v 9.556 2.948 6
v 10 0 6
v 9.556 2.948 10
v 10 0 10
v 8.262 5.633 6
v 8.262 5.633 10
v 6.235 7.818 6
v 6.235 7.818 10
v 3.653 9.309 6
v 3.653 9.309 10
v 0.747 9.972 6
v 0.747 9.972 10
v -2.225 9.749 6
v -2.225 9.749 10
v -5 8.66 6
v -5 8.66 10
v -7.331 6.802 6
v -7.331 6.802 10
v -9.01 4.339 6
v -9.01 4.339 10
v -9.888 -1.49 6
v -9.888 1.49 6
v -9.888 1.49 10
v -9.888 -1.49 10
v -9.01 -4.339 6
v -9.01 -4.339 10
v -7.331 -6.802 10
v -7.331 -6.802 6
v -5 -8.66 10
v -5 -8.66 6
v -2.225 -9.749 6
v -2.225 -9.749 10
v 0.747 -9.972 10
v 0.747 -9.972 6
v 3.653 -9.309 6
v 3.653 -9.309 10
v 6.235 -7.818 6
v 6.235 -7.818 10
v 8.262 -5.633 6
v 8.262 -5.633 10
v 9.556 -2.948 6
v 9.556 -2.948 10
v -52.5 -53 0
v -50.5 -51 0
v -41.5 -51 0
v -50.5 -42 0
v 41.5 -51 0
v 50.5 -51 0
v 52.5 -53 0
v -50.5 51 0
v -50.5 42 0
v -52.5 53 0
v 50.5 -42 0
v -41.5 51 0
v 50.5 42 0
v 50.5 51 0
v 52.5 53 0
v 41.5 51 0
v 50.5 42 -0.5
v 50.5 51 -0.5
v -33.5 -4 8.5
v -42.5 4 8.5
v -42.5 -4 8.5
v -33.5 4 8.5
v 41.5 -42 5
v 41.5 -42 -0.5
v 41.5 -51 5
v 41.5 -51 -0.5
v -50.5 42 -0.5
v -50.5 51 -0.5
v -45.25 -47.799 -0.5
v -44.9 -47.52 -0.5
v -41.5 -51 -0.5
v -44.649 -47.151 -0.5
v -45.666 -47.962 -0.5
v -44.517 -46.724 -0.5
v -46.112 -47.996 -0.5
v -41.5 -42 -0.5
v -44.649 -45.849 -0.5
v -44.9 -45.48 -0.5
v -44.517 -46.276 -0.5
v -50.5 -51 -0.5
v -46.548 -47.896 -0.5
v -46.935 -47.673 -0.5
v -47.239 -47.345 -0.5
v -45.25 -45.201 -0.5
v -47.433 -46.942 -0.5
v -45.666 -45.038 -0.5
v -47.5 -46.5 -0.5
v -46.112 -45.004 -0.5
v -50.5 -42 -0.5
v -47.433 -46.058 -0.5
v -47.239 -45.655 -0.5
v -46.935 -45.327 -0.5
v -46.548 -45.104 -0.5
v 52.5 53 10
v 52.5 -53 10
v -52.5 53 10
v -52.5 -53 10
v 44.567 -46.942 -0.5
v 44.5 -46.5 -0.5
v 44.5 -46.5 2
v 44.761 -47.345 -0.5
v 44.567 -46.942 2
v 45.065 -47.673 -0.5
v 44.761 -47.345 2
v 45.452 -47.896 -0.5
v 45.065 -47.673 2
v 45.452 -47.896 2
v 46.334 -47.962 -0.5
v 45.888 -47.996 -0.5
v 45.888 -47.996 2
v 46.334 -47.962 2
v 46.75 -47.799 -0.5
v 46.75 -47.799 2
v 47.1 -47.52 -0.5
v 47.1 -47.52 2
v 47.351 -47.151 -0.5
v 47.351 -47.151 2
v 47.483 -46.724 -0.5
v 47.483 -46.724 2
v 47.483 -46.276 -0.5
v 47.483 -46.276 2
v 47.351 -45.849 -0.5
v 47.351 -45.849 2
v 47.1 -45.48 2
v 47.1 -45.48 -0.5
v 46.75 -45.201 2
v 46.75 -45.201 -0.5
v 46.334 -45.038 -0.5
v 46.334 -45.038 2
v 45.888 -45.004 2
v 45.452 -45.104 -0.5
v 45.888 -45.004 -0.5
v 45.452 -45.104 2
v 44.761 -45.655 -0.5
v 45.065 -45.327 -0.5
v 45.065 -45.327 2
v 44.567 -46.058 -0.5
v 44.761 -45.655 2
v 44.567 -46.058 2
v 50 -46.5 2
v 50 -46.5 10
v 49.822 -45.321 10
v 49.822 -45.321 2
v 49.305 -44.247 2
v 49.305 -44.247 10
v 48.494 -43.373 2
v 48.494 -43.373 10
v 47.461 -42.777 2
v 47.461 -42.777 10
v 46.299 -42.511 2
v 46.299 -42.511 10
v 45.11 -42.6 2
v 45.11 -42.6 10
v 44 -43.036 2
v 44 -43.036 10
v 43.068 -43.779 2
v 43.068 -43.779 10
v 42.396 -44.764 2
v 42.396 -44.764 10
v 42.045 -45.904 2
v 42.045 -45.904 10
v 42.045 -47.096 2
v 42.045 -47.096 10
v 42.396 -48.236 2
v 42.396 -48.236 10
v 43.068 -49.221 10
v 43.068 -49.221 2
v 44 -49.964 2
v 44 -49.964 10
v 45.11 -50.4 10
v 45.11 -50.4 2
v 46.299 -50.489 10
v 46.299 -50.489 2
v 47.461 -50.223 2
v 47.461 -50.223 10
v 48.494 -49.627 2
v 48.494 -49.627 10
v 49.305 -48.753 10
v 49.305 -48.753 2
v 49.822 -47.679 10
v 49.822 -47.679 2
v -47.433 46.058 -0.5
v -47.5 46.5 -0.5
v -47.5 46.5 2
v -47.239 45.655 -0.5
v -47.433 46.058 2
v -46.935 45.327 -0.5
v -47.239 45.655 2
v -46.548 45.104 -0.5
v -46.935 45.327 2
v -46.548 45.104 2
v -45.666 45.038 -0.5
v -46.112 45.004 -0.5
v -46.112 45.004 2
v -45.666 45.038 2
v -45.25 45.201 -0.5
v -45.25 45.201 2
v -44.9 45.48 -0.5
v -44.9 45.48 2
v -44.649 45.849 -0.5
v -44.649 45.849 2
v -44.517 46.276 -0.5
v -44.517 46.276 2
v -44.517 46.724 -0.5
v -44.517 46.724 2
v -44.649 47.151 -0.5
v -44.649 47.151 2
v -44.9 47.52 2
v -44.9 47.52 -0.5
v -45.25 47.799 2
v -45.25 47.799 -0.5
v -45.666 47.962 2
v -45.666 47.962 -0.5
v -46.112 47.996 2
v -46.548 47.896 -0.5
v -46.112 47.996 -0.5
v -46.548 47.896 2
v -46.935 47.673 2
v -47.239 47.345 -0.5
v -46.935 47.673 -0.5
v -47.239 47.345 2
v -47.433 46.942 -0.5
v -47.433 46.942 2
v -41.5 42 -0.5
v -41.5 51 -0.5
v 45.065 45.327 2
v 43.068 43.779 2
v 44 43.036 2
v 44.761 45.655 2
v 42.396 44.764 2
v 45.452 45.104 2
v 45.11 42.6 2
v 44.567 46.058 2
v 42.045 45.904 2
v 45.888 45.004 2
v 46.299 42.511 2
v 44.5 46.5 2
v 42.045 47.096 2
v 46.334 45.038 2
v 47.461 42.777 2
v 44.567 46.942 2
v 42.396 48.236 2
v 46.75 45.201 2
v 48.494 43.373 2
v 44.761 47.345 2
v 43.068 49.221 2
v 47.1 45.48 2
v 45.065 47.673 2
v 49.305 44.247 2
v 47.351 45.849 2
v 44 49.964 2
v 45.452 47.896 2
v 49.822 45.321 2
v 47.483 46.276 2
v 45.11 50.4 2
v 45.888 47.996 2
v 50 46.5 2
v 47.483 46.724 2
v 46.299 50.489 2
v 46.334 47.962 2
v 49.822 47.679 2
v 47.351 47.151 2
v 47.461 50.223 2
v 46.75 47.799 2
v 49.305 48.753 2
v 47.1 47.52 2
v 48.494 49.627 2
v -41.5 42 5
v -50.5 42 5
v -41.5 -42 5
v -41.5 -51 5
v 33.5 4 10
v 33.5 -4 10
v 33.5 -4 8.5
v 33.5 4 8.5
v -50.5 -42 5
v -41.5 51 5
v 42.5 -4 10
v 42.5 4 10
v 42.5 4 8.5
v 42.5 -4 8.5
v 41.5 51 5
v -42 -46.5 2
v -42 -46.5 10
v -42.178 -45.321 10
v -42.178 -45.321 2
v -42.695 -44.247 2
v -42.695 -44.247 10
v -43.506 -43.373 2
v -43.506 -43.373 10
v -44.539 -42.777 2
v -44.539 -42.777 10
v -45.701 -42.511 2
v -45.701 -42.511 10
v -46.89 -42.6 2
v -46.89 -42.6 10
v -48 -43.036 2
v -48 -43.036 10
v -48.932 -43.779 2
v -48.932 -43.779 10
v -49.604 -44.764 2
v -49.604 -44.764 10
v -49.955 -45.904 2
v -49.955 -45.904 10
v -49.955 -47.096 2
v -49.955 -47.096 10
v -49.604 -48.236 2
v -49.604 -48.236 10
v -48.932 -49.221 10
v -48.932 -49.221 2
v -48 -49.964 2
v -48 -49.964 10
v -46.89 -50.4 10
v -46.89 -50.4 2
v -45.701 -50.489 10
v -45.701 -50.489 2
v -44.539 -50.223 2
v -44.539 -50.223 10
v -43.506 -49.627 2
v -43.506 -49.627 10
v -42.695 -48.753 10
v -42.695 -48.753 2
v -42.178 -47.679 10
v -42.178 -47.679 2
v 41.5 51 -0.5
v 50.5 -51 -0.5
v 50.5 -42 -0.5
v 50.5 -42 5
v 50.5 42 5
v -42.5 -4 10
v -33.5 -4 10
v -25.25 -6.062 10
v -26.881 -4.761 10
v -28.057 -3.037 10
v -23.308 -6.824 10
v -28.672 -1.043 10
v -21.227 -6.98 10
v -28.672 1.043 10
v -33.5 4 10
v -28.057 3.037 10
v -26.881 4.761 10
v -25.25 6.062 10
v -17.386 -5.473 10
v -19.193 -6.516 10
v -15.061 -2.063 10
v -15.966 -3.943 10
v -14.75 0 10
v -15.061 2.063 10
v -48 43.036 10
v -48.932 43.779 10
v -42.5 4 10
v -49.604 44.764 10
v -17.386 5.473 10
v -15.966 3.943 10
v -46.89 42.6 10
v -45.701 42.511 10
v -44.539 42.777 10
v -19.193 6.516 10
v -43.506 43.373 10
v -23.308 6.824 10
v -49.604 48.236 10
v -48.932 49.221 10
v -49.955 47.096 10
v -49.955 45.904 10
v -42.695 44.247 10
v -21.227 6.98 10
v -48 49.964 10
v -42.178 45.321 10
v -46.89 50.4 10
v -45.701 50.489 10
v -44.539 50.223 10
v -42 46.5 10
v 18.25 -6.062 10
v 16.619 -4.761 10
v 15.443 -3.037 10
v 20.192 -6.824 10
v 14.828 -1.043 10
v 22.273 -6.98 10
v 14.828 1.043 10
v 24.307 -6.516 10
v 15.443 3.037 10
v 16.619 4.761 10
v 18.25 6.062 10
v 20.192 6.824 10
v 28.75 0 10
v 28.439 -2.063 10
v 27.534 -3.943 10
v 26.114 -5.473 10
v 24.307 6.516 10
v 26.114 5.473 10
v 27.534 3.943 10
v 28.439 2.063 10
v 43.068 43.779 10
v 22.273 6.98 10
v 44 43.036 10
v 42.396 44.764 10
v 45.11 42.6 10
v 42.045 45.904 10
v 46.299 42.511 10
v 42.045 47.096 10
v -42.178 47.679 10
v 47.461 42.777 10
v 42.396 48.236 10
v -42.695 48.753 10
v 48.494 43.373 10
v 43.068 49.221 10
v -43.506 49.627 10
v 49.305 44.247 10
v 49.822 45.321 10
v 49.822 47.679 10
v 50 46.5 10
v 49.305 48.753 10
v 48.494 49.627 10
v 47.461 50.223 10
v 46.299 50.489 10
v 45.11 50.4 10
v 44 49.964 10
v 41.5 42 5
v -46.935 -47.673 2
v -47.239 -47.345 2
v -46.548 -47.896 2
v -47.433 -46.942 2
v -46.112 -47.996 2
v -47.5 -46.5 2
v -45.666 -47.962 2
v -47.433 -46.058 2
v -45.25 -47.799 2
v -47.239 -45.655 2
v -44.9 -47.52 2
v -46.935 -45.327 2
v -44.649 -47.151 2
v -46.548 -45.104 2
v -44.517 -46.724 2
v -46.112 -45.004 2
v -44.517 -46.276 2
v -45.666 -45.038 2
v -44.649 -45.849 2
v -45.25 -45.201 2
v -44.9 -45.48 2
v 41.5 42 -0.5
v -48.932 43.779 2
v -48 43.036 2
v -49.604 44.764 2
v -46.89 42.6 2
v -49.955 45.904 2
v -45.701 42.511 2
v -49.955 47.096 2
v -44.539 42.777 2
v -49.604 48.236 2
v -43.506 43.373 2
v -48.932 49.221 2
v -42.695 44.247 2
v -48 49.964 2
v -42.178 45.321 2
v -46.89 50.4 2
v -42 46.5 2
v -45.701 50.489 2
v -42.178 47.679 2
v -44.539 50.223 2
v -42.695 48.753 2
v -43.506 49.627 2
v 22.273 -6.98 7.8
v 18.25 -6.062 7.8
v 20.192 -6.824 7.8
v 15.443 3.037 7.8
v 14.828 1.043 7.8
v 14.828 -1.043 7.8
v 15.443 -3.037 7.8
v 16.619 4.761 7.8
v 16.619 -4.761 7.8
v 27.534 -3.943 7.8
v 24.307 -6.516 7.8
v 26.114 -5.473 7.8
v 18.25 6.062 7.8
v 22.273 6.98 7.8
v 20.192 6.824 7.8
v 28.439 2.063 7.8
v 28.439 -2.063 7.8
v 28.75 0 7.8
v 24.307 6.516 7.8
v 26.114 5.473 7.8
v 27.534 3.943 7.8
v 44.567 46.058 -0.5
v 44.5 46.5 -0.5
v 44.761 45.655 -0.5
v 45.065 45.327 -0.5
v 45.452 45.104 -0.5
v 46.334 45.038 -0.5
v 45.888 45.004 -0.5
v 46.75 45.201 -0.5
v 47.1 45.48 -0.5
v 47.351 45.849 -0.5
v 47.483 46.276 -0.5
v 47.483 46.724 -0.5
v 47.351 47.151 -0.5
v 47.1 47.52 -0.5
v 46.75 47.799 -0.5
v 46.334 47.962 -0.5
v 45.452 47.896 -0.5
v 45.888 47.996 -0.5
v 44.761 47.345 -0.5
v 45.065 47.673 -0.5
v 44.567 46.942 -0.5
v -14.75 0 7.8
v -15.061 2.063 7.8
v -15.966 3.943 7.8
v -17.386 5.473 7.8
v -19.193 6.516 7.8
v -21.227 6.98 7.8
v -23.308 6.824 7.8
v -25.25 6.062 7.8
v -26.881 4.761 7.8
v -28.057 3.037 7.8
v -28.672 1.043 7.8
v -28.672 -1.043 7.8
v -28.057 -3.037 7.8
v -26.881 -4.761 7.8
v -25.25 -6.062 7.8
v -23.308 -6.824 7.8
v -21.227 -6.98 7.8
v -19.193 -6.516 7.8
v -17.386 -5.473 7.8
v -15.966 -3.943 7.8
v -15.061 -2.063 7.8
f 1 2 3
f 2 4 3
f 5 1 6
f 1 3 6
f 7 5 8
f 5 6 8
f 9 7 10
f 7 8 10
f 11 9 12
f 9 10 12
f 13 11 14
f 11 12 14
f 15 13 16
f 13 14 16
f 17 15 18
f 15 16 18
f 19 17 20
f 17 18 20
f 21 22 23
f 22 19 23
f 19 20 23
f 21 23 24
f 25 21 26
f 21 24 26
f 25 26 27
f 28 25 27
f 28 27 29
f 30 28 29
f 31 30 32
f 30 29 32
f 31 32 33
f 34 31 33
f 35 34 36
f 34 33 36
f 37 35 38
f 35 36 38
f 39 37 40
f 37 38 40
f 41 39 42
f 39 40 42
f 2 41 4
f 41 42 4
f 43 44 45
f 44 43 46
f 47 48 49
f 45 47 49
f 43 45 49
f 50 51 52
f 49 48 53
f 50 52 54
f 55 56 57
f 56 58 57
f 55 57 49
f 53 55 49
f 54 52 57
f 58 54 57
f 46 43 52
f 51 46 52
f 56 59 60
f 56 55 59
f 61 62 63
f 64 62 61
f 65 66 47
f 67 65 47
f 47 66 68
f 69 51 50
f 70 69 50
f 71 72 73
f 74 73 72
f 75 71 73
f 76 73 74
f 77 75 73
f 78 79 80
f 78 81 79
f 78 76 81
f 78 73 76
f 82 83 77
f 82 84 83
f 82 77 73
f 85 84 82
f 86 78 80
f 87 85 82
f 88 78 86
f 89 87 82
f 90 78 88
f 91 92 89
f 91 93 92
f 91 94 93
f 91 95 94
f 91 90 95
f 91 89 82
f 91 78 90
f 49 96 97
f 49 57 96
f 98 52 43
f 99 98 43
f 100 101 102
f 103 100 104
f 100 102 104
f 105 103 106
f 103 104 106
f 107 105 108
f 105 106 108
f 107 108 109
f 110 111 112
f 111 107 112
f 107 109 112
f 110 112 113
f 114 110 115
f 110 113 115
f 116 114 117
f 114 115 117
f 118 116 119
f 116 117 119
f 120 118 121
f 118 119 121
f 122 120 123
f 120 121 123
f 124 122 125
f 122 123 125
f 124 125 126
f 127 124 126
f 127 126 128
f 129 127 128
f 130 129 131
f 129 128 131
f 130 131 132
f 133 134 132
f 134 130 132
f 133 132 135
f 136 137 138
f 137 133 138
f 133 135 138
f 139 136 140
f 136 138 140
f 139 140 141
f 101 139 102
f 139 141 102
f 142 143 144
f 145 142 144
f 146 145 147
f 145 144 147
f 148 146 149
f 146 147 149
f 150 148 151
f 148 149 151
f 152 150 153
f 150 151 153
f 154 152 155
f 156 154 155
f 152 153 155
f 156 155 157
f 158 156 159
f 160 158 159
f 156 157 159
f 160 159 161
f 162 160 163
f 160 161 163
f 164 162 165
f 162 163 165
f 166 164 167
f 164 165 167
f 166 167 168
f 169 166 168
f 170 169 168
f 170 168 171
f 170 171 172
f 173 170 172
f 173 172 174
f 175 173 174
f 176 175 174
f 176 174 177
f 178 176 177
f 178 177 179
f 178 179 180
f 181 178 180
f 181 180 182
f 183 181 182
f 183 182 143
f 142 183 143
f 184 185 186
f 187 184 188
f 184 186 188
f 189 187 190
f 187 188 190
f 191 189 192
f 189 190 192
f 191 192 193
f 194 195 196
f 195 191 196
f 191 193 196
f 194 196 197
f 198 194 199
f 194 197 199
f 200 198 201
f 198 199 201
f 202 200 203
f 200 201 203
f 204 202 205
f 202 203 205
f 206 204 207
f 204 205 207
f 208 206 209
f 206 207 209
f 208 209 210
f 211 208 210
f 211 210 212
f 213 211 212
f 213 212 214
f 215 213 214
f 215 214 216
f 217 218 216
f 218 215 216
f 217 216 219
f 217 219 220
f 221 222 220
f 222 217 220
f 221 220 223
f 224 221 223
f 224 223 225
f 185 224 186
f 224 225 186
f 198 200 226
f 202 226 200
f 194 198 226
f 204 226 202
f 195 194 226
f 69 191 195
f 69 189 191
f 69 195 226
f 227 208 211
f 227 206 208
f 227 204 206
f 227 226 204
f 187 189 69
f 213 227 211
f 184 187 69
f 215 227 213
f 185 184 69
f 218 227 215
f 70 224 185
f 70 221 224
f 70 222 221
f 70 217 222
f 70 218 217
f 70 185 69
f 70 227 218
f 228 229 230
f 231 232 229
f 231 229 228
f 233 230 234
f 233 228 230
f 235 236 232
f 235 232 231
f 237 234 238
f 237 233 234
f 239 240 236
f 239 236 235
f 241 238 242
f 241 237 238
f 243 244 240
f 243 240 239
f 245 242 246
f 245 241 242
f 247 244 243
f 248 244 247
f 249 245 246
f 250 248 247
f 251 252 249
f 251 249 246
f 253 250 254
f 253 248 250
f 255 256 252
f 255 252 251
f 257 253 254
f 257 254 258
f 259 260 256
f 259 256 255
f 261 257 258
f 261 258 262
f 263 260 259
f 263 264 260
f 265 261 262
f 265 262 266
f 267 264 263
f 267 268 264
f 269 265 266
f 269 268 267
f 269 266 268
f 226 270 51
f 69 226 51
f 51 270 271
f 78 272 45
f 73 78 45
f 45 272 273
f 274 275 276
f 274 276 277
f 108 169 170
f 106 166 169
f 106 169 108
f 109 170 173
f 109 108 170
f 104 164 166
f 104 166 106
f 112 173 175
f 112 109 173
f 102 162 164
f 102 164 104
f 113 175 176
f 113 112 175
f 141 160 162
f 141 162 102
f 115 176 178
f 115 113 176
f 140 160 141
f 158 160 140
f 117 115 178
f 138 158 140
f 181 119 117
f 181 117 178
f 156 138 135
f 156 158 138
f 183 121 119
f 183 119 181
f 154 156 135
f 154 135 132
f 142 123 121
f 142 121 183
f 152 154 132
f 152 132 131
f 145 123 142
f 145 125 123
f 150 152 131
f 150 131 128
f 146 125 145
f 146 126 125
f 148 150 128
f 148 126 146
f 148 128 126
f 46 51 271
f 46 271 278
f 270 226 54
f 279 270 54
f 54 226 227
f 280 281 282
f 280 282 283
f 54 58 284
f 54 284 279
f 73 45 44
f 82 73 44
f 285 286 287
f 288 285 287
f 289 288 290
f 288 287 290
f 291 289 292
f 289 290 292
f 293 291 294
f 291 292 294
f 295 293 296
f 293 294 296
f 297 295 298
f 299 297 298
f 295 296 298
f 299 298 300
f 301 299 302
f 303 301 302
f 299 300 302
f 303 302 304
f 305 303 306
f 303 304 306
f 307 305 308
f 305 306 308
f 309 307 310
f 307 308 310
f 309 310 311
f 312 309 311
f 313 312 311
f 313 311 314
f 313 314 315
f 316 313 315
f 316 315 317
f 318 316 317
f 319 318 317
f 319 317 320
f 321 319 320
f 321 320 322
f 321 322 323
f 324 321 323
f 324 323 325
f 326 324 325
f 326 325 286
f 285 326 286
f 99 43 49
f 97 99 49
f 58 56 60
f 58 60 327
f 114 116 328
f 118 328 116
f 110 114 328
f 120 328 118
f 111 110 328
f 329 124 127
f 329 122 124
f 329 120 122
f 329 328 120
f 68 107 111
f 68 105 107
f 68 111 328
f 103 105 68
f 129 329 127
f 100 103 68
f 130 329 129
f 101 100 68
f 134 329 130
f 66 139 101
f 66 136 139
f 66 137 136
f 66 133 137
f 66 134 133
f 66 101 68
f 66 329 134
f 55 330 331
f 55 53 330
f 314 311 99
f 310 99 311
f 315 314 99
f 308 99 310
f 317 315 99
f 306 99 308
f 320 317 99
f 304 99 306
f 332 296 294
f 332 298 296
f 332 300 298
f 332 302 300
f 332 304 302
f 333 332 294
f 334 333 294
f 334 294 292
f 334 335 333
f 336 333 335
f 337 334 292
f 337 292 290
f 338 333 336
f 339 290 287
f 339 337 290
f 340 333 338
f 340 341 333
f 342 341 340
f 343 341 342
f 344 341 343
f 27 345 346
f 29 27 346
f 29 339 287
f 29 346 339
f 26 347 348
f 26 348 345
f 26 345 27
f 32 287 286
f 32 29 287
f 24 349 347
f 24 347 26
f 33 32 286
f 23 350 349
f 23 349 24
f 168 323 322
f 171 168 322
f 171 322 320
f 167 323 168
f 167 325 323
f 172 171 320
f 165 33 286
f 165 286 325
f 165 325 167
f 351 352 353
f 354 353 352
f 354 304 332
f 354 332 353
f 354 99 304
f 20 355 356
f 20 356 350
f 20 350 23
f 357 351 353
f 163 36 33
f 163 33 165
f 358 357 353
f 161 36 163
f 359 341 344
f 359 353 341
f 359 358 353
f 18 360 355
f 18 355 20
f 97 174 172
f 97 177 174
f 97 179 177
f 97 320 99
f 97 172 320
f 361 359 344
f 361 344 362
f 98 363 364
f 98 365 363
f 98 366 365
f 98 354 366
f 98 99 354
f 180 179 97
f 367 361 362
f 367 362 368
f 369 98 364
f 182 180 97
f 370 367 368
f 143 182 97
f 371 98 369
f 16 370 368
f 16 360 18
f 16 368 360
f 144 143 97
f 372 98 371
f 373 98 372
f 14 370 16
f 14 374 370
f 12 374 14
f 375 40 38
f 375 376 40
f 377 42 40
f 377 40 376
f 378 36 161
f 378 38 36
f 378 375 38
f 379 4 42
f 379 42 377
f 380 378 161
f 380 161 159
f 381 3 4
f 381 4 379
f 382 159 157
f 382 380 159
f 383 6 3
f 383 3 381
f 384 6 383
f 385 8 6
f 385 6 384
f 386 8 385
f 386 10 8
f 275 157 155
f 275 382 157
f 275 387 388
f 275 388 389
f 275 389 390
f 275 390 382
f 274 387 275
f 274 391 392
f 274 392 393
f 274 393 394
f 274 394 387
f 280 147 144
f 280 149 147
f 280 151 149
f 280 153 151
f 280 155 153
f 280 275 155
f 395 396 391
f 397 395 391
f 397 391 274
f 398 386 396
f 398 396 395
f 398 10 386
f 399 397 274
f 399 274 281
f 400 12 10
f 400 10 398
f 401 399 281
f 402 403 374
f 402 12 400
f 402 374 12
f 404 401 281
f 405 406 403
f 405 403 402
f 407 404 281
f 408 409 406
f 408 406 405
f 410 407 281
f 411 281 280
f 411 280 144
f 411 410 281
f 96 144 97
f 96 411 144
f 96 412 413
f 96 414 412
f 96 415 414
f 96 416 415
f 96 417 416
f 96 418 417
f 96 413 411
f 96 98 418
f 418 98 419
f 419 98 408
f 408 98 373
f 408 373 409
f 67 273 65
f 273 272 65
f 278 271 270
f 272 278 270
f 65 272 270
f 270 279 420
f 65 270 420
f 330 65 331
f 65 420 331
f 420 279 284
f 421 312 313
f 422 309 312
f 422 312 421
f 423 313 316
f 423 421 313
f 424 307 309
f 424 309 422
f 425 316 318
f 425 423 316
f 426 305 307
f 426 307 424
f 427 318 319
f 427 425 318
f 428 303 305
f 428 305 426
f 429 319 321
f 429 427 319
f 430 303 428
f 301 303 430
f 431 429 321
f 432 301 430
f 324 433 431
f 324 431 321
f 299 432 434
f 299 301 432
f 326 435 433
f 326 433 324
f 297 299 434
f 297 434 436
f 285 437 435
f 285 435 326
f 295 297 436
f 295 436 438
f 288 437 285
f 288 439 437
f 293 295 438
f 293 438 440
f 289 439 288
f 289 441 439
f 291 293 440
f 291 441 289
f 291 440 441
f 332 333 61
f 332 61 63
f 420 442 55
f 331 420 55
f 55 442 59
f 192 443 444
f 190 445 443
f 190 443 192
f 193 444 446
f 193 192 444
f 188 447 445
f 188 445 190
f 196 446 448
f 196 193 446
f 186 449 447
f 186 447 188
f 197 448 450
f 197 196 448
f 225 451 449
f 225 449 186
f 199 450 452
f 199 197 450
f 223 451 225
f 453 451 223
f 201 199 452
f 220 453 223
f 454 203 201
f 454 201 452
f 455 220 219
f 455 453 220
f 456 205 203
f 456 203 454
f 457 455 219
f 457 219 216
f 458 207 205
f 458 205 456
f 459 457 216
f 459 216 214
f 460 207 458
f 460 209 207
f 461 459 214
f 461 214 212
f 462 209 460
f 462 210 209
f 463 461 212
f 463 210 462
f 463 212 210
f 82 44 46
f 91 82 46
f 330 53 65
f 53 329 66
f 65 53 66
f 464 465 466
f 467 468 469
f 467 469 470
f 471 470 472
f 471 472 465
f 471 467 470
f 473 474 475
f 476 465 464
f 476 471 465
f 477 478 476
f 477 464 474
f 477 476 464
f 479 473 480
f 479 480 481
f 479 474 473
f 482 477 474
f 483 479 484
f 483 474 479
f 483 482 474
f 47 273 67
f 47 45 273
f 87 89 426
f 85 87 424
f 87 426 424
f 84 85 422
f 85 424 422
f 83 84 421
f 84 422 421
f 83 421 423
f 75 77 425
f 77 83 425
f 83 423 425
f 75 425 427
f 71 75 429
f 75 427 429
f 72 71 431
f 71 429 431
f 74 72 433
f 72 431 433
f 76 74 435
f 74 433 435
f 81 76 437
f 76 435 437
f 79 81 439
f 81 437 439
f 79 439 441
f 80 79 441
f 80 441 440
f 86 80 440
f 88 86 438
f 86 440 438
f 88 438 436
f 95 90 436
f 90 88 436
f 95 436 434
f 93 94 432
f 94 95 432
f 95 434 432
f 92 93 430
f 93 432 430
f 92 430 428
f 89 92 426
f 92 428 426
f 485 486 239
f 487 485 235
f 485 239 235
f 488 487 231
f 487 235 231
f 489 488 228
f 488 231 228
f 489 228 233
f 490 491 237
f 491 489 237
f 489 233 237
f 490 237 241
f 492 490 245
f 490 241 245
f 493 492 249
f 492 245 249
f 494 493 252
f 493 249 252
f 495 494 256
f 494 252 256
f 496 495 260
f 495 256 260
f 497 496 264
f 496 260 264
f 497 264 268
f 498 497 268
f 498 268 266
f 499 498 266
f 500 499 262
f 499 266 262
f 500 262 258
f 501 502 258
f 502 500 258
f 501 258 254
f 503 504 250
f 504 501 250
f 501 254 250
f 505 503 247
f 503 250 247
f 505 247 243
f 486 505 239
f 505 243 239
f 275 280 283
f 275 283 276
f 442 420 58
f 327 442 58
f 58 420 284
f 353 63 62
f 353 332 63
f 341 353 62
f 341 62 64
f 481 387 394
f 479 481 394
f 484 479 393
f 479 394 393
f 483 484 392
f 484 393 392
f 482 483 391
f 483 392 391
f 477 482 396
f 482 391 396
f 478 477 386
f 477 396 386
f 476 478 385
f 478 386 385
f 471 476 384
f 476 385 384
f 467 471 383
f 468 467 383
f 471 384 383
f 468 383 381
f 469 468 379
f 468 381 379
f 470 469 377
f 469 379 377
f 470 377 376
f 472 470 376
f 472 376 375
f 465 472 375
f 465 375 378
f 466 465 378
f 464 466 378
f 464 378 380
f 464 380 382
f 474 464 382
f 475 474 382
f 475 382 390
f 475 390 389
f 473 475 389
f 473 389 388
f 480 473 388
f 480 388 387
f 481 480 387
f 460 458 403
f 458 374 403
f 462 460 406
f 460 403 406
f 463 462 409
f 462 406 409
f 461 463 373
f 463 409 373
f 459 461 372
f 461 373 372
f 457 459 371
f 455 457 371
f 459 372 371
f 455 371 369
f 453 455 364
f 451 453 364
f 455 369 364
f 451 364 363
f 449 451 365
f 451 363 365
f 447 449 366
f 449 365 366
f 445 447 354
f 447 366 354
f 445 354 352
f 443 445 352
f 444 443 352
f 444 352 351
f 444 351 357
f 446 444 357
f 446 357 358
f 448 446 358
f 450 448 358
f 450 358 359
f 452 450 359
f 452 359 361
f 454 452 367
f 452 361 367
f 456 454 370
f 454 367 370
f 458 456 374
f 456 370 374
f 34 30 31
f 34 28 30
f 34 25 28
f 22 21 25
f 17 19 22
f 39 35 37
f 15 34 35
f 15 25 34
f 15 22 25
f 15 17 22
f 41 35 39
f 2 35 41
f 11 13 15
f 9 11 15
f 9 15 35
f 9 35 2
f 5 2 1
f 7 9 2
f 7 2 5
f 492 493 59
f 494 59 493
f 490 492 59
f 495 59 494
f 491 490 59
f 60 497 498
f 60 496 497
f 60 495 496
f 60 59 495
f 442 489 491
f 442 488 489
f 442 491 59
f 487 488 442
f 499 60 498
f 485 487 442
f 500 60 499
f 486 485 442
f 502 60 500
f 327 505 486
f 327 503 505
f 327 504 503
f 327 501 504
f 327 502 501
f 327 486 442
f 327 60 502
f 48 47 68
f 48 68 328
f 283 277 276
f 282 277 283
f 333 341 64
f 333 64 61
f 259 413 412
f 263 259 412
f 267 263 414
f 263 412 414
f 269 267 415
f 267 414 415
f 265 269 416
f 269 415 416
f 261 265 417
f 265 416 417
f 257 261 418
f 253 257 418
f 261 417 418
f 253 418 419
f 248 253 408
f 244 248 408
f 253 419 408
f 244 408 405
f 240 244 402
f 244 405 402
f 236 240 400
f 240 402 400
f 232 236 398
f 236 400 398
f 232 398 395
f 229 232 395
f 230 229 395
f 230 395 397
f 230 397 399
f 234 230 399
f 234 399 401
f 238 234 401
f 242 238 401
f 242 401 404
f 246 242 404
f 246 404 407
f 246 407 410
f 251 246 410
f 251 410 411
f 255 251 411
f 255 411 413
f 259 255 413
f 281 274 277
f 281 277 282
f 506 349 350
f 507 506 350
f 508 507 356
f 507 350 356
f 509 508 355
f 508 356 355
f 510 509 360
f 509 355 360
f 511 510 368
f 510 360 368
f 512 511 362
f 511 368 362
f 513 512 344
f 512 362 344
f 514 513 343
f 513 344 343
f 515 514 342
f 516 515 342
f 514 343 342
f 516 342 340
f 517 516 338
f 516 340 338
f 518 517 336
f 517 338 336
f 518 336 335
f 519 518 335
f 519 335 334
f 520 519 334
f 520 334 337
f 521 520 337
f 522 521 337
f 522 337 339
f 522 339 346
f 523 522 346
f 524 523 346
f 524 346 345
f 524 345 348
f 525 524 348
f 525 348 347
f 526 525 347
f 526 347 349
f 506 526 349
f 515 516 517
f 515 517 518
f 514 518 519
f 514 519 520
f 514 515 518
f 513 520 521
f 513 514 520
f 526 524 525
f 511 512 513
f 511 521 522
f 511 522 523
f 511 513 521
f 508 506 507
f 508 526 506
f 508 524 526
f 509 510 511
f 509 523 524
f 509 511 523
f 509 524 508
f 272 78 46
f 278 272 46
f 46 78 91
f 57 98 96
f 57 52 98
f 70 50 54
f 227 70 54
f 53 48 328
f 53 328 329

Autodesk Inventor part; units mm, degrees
ref_plane "YZ Plane" through (0, 0, 0) normal (1, 0, 0) x (0, 1, 0)
ref_plane "XZ Plane" through (0, 0, 0) normal (0, 1, 0) x (-1, 0, 0)
ref_plane "XY Plane" through (0, 0, 0) normal (0, 0, 1) x (1, 0, 0)
sketch "Sketch1" plane through (0, 0, 0) normal (0, 0, 1) x (1, 0, 0)
  line L0 (52.5, 53) -> (52.5, -53) projected
  line L1 (-52.5, 53) -> (52.5, 53) projected
  line L2 (52.5, 53) -> (-52.5, 53)
  line L3 (-52.5, 53) -> (-52.5, -53)
  line L4 (-52.5, -53) -> (52.5, -53)
  line L5 (52.5, -53) -> (52.5, 53)
  line L6 (50.5, -51) -> (50.5, 51) projected
  line L7 (50.5, 51) -> (-50.5, 51) projected
  line L8 (50.5, 51) -> (-50.5, 51)
  line L9 (-50.5, 51) -> (-50.5, -51)
  line L10 (-50.5, -51) -> (50.5, -51)
  line L11 (50.5, -51) -> (50.5, 51)
  point P0 (0, 0)
extrude "Extrusion1" add sketch "Sketch1" along normal blind 10
sketch "Sketch2" plane through (0, 0, 0) normal (0, 0, -1) x (-1, 0, 0)
  circle A0 centre (-46, 46.5) radius 1.5 projected
  line L0 (-50.5, 51) -> (-50.5, 42) projected
  line L1 (-41.5, 51) -> (-50.5, 51) projected
  line L2 (-41.5, 51) -> (-41.5, 42) projected
  line L3 (-41.5, 42) -> (-50.5, 42) projected
  circle A1 centre (-46, -46.5) radius 1.5 projected
  line L4 (-41.5, -42) -> (-41.5, -51) projected
  line L5 (-50.5, -51) -> (-41.5, -51) projected
  line L6 (-50.5, -42) -> (-50.5, -51) projected
  line L7 (-50.5, -42) -> (-41.5, -42) projected
  circle A2 centre (46, -46.5) radius 1.5 projected
  line L8 (50.5, -51) -> (50.5, -42) projected
  line L9 (41.5, -51) -> (50.5, -51) projected
  line L10 (41.5, -51) -> (41.5, -42) projected
  line L11 (41.5, -42) -> (50.5, -42) projected
  circle A3 centre (46, 46.5) radius 1.5 projected
  line L12 (41.5, 42) -> (41.5, 51) projected
  line L13 (50.5, 51) -> (41.5, 51) projected
  line L14 (50.5, 42) -> (50.5, 51) projected
  line L15 (50.5, 42) -> (41.5, 42) projected
  point P0 (0, 0)
extrude "Extrusion2" add sketch "Sketch2" against normal blind 10
sketch "Sketch3" plane through (0, 0, 10) normal (0, 0, 1) x (1, 0, 0)
  line L0 (43.467, -7.68) -> (39.533, -7.68) projected
  line L1 (39.533, -7.68) -> (39.533, -6.68) projected
  line L2 (39.533, -6.68) -> (43.467, -6.68) projected
  line L3 (43.467, -6.68) -> (43.467, -7.68) projected
  line L4 (41.5, 42) -> (41.5, 51) projected
  line L5 (41.5, 51) -> (-41.5, 51) projected
  line L6 (-41.5, 51) -> (-41.5, 42) projected
  line L7 (-41.5, 42) -> (-50.5, 42) projected
  line L8 (-50.5, 42) -> (-50.5, -42) projected
  line L9 (-50.5, -42) -> (-41.5, -42) projected
  line L10 (-41.5, -42) -> (-41.5, -51) projected
  line L11 (-41.5, -51) -> (41.5, -51) projected
  line L12 (41.5, -51) -> (41.5, -42) projected
  line L13 (41.5, -42) -> (50.5, -42) projected
  line L14 (50.5, -42) -> (50.5, 42) projected
  line L15 (50.5, 42) -> (41.5, 42) projected
  line L16 (43.467, -7.68) -> (39.533, -7.68) projected
  line L17 (39.533, -7.68) -> (39.533, -6.68) projected
  line L18 (39.533, -6.68) -> (43.467, -6.68) projected
  line L19 (43.467, -6.68) -> (43.467, -7.68) projected
  line L20 (41.5, 42) -> (41.5, 51) projected
  line L21 (41.5, 51) -> (-41.5, 51) projected
  line L22 (-41.5, 51) -> (-41.5, 42) projected
  line L23 (-41.5, 42) -> (-50.5, 42) projected
  line L24 (-50.5, 42) -> (-50.5, -42) projected
  line L25 (-50.5, -42) -> (-41.5, -42) projected
  line L26 (-41.5, -42) -> (-41.5, -51) projected
  line L27 (-41.5, -51) -> (41.5, -51) projected
  line L28 (41.5, -51) -> (41.5, -42) projected
  line L29 (41.5, -42) -> (50.5, -42) projected
  line L30 (50.5, -42) -> (50.5, 42) projected
  line L31 (50.5, 42) -> (41.5, 42) projected
  circle A0 centre (44.2752, 10.8885) radius 1.8923 projected
  circle A1 centre (-22.2674, 46.7091) radius 1.9651 projected
  line L32 (38.467, -7.68) -> (34.533, -7.68) projected
  line L33 (34.533, -7.68) -> (34.533, -6.68) projected
  line L34 (34.533, -6.68) -> (38.467, -6.68) projected
  line L35 (38.467, -6.68) -> (38.467, -7.68) projected
  circle A2 centre (-36.634, 10.3057) radius 1.9118 projected
  circle A3 centre (44.2752, 10.8885) radius 1.8923 projected
  circle A4 centre (-22.2674, 46.7091) radius 1.9651 projected
  line L36 (38.467, -7.68) -> (34.533, -7.68) projected
  line L37 (34.533, -7.68) -> (34.533, -6.68) projected
  line L38 (34.533, -6.68) -> (38.467, -6.68) projected
  line L39 (38.467, -6.68) -> (38.467, -7.68) projected
  circle A5 centre (-36.634, 10.3057) radius 1.9118 projected
  point P0 (0, 0)
extrude "Extrusion3" add sketch "Sketch3" against normal blind 5 contours L0 L1 L2 L3 | L15 L14 L13 L12 L11 L10 L9 L8 L7 L6 L5 L4 | A0 | A1 | L32 L33 L34 L35 | A2
sketch "Sketch4" plane through (0, 0, 10) normal (0, 0, 1) x (1, 0, 0)
  circle A0 centre (46, 46.5) radius 1.5 projected
  circle A1 centre (46, -46.5) radius 1.5 projected
  circle A2 centre (-46, -46.5) radius 1.5 projected
  circle A3 centre (-46, 46.5) radius 1.5 projected
  circle A4 centre (46, 46.5) radius 4
  circle A5 centre (46, -46.5) radius 4
  circle A6 centre (-46, -46.5) radius 4
  circle A7 centre (-46, 46.5) radius 4
  point P0 (0, 0)
  dimension "d6" = 8
  dimension "d7" = 8
  dimension "d8" = 8
  dimension "d9" = 8
extrude "Extrusion4" cut sketch "Sketch4" against normal blind 8
sketch "Sketch5" plane through (0, 0, 10) normal (0, 0, 1) x (1, 0, 0)
  line L0 (-52.5, -53) -> (52.5, -53) projected
  line L1 (52.5, -53) -> (52.5, 53) projected
  line L2 (-52.5, -53) -> (52.5, -53)
  line L3 (52.5, -53) -> (52.5, 53)
  line L4 (52.5, 53) -> (-52.5, 53)
  line L5 (-52.5, 53) -> (-52.5, -53)
  line L6 (-52.5, 53) -> (-52.5, 0)
  circle A0 centre (0, 0) radius 10
  line L7 (-52.5, 0) -> (-42.5, 0)
  line L8 (-42.5, 0) -> (-42.5, 4)
  line L9 (-42.5, 4) -> (-33.5, 4)
  line L10 (-33.5, 4) -> (-33.5, -4)
  line L11 (-33.5, -4) -> (-42.5, -4)
  line L12 (-42.5, -4) -> (-42.5, 0)
  line L13 (-33.5, 0) -> (-10, 0)
  line L14 (-10, 0) -> (-21.75, 0)
  circle A1 centre (-21.75, 0) radius 7
  line L15 (0, 0) -> (21.75, 0)
  line L16 (42.5, 0) -> (42.5, -4)
  line L17 (42.5, -4) -> (33.5, -4)
  line L18 (33.5, -4) -> (33.5, 4)
  line L19 (33.5, 4) -> (42.5, 4)
  line L20 (42.5, 4) -> (42.5, 0)
  circle A2 centre (21.75, 0) radius 7
  point P0 (33.5, 0)
  dimension "d12" = 20
  dimension "d14" = 10
  dimension "d15" = 4
  dimension "d16" = 9
  dimension "d17" = 8
  dimension "d18" = 14
  dimension "d19" = 21.75
  dimension "d20" = 4
  dimension "d21" = 9
  dimension "d22" = 8
  dimension "d23" = 14
extrude "Extrusion5" cut sketch "Sketch5" against normal blind 4 contours A0
extrude "Extrusion6" cut sketch "Sketch5" against normal blind 2.2 contours A2 | A1 L13 | L13 A1
extrude "Extrusion7" cut sketch "Sketch5" against normal blind 1.5 contours L8 L9 L10 L11 L12 | L16 L17 L18 L19 L20
sketch "Sketch6" plane through (0, 0, 0) normal (0, 0, -1) x (-1, 0, 0)
  line L0 (-41.5, 42) -> (-41.5, 51) projected
  line L1 (-50.5, 42) -> (-41.5, 42) projected
  line L2 (-50.5, -42) -> (-50.5, 42) projected
  line L3 (-41.5, -42) -> (-50.5, -42) projected
  line L4 (-41.5, -51) -> (-41.5, -42) projected
  line L5 (41.5, -51) -> (-41.5, -51) projected
  line L6 (41.5, -42) -> (41.5, -51) projected
  line L7 (50.5, -42) -> (41.5, -42) projected
  line L8 (50.5, 42) -> (50.5, -42) projected
  line L9 (41.5, 42) -> (50.5, 42) projected
  line L10 (41.5, 51) -> (41.5, 42) projected
  line L11 (-41.5, 51) -> (41.5, 51) projected
  circle A0 centre (-46, 46.5) radius 1.5 projected
  circle A1 centre (-46, -46.5) radius 1.5 projected
  circle A2 centre (46, -46.5) radius 1.5 projected
  circle A3 centre (46, 46.5) radius 1.5 projected
  line L12 (-52.5, -53) -> (-52.5, 53) projected
  line L13 (52.5, -53) -> (-52.5, -53) projected
  line L14 (52.5, 53) -> (52.5, -53) projected
  line L15 (-52.5, 53) -> (52.5, 53) projected
  line L16 (-50.5, 42) -> (-50.5, -42) projected
  line L17 (-50.5, 42) -> (-41.5, 42) projected
  line L18 (-41.5, 42) -> (-41.5, 51) projected
  line L19 (41.5, 51) -> (-41.5, 51) projected
  line L20 (41.5, 51) -> (41.5, 42) projected
  line L21 (41.5, 42) -> (50.5, 42) projected
  line L22 (50.5, -42) -> (50.5, 42) projected
  line L23 (50.5, -42) -> (41.5, -42) projected
  line L24 (41.5, -42) -> (41.5, -51) projected
  line L25 (-41.5, -51) -> (41.5, -51) projected
  line L26 (-41.5, -51) -> (-41.5, -42) projected
  line L27 (-41.5, -42) -> (-50.5, -42) projected
  line L28 (41.5, -51) -> (50.5, -51)
  line L29 (50.5, -51) -> (50.5, -42)
  line L30 (-41.5, -51) -> (-50.5, -51)
  line L31 (-50.5, -51) -> (-50.5, -42)
  line L32 (-50.5, 42) -> (-50.5, 51)
  line L33 (-50.5, 51) -> (-41.5, 51)
  line L34 (50.5, 42) -> (50.5, 51)
  line L35 (50.5, 51) -> (41.5, 51)
  point P0 (0, 0)
extrude "Extrusion8" add sketch "Sketch6" along normal blind 0.5 contours L1 L32 L33 L0 | L35 L34 L9 L10 | L3 L4 L30 L31 | L29 L28 L6 L7
properties part number "parte superior"
